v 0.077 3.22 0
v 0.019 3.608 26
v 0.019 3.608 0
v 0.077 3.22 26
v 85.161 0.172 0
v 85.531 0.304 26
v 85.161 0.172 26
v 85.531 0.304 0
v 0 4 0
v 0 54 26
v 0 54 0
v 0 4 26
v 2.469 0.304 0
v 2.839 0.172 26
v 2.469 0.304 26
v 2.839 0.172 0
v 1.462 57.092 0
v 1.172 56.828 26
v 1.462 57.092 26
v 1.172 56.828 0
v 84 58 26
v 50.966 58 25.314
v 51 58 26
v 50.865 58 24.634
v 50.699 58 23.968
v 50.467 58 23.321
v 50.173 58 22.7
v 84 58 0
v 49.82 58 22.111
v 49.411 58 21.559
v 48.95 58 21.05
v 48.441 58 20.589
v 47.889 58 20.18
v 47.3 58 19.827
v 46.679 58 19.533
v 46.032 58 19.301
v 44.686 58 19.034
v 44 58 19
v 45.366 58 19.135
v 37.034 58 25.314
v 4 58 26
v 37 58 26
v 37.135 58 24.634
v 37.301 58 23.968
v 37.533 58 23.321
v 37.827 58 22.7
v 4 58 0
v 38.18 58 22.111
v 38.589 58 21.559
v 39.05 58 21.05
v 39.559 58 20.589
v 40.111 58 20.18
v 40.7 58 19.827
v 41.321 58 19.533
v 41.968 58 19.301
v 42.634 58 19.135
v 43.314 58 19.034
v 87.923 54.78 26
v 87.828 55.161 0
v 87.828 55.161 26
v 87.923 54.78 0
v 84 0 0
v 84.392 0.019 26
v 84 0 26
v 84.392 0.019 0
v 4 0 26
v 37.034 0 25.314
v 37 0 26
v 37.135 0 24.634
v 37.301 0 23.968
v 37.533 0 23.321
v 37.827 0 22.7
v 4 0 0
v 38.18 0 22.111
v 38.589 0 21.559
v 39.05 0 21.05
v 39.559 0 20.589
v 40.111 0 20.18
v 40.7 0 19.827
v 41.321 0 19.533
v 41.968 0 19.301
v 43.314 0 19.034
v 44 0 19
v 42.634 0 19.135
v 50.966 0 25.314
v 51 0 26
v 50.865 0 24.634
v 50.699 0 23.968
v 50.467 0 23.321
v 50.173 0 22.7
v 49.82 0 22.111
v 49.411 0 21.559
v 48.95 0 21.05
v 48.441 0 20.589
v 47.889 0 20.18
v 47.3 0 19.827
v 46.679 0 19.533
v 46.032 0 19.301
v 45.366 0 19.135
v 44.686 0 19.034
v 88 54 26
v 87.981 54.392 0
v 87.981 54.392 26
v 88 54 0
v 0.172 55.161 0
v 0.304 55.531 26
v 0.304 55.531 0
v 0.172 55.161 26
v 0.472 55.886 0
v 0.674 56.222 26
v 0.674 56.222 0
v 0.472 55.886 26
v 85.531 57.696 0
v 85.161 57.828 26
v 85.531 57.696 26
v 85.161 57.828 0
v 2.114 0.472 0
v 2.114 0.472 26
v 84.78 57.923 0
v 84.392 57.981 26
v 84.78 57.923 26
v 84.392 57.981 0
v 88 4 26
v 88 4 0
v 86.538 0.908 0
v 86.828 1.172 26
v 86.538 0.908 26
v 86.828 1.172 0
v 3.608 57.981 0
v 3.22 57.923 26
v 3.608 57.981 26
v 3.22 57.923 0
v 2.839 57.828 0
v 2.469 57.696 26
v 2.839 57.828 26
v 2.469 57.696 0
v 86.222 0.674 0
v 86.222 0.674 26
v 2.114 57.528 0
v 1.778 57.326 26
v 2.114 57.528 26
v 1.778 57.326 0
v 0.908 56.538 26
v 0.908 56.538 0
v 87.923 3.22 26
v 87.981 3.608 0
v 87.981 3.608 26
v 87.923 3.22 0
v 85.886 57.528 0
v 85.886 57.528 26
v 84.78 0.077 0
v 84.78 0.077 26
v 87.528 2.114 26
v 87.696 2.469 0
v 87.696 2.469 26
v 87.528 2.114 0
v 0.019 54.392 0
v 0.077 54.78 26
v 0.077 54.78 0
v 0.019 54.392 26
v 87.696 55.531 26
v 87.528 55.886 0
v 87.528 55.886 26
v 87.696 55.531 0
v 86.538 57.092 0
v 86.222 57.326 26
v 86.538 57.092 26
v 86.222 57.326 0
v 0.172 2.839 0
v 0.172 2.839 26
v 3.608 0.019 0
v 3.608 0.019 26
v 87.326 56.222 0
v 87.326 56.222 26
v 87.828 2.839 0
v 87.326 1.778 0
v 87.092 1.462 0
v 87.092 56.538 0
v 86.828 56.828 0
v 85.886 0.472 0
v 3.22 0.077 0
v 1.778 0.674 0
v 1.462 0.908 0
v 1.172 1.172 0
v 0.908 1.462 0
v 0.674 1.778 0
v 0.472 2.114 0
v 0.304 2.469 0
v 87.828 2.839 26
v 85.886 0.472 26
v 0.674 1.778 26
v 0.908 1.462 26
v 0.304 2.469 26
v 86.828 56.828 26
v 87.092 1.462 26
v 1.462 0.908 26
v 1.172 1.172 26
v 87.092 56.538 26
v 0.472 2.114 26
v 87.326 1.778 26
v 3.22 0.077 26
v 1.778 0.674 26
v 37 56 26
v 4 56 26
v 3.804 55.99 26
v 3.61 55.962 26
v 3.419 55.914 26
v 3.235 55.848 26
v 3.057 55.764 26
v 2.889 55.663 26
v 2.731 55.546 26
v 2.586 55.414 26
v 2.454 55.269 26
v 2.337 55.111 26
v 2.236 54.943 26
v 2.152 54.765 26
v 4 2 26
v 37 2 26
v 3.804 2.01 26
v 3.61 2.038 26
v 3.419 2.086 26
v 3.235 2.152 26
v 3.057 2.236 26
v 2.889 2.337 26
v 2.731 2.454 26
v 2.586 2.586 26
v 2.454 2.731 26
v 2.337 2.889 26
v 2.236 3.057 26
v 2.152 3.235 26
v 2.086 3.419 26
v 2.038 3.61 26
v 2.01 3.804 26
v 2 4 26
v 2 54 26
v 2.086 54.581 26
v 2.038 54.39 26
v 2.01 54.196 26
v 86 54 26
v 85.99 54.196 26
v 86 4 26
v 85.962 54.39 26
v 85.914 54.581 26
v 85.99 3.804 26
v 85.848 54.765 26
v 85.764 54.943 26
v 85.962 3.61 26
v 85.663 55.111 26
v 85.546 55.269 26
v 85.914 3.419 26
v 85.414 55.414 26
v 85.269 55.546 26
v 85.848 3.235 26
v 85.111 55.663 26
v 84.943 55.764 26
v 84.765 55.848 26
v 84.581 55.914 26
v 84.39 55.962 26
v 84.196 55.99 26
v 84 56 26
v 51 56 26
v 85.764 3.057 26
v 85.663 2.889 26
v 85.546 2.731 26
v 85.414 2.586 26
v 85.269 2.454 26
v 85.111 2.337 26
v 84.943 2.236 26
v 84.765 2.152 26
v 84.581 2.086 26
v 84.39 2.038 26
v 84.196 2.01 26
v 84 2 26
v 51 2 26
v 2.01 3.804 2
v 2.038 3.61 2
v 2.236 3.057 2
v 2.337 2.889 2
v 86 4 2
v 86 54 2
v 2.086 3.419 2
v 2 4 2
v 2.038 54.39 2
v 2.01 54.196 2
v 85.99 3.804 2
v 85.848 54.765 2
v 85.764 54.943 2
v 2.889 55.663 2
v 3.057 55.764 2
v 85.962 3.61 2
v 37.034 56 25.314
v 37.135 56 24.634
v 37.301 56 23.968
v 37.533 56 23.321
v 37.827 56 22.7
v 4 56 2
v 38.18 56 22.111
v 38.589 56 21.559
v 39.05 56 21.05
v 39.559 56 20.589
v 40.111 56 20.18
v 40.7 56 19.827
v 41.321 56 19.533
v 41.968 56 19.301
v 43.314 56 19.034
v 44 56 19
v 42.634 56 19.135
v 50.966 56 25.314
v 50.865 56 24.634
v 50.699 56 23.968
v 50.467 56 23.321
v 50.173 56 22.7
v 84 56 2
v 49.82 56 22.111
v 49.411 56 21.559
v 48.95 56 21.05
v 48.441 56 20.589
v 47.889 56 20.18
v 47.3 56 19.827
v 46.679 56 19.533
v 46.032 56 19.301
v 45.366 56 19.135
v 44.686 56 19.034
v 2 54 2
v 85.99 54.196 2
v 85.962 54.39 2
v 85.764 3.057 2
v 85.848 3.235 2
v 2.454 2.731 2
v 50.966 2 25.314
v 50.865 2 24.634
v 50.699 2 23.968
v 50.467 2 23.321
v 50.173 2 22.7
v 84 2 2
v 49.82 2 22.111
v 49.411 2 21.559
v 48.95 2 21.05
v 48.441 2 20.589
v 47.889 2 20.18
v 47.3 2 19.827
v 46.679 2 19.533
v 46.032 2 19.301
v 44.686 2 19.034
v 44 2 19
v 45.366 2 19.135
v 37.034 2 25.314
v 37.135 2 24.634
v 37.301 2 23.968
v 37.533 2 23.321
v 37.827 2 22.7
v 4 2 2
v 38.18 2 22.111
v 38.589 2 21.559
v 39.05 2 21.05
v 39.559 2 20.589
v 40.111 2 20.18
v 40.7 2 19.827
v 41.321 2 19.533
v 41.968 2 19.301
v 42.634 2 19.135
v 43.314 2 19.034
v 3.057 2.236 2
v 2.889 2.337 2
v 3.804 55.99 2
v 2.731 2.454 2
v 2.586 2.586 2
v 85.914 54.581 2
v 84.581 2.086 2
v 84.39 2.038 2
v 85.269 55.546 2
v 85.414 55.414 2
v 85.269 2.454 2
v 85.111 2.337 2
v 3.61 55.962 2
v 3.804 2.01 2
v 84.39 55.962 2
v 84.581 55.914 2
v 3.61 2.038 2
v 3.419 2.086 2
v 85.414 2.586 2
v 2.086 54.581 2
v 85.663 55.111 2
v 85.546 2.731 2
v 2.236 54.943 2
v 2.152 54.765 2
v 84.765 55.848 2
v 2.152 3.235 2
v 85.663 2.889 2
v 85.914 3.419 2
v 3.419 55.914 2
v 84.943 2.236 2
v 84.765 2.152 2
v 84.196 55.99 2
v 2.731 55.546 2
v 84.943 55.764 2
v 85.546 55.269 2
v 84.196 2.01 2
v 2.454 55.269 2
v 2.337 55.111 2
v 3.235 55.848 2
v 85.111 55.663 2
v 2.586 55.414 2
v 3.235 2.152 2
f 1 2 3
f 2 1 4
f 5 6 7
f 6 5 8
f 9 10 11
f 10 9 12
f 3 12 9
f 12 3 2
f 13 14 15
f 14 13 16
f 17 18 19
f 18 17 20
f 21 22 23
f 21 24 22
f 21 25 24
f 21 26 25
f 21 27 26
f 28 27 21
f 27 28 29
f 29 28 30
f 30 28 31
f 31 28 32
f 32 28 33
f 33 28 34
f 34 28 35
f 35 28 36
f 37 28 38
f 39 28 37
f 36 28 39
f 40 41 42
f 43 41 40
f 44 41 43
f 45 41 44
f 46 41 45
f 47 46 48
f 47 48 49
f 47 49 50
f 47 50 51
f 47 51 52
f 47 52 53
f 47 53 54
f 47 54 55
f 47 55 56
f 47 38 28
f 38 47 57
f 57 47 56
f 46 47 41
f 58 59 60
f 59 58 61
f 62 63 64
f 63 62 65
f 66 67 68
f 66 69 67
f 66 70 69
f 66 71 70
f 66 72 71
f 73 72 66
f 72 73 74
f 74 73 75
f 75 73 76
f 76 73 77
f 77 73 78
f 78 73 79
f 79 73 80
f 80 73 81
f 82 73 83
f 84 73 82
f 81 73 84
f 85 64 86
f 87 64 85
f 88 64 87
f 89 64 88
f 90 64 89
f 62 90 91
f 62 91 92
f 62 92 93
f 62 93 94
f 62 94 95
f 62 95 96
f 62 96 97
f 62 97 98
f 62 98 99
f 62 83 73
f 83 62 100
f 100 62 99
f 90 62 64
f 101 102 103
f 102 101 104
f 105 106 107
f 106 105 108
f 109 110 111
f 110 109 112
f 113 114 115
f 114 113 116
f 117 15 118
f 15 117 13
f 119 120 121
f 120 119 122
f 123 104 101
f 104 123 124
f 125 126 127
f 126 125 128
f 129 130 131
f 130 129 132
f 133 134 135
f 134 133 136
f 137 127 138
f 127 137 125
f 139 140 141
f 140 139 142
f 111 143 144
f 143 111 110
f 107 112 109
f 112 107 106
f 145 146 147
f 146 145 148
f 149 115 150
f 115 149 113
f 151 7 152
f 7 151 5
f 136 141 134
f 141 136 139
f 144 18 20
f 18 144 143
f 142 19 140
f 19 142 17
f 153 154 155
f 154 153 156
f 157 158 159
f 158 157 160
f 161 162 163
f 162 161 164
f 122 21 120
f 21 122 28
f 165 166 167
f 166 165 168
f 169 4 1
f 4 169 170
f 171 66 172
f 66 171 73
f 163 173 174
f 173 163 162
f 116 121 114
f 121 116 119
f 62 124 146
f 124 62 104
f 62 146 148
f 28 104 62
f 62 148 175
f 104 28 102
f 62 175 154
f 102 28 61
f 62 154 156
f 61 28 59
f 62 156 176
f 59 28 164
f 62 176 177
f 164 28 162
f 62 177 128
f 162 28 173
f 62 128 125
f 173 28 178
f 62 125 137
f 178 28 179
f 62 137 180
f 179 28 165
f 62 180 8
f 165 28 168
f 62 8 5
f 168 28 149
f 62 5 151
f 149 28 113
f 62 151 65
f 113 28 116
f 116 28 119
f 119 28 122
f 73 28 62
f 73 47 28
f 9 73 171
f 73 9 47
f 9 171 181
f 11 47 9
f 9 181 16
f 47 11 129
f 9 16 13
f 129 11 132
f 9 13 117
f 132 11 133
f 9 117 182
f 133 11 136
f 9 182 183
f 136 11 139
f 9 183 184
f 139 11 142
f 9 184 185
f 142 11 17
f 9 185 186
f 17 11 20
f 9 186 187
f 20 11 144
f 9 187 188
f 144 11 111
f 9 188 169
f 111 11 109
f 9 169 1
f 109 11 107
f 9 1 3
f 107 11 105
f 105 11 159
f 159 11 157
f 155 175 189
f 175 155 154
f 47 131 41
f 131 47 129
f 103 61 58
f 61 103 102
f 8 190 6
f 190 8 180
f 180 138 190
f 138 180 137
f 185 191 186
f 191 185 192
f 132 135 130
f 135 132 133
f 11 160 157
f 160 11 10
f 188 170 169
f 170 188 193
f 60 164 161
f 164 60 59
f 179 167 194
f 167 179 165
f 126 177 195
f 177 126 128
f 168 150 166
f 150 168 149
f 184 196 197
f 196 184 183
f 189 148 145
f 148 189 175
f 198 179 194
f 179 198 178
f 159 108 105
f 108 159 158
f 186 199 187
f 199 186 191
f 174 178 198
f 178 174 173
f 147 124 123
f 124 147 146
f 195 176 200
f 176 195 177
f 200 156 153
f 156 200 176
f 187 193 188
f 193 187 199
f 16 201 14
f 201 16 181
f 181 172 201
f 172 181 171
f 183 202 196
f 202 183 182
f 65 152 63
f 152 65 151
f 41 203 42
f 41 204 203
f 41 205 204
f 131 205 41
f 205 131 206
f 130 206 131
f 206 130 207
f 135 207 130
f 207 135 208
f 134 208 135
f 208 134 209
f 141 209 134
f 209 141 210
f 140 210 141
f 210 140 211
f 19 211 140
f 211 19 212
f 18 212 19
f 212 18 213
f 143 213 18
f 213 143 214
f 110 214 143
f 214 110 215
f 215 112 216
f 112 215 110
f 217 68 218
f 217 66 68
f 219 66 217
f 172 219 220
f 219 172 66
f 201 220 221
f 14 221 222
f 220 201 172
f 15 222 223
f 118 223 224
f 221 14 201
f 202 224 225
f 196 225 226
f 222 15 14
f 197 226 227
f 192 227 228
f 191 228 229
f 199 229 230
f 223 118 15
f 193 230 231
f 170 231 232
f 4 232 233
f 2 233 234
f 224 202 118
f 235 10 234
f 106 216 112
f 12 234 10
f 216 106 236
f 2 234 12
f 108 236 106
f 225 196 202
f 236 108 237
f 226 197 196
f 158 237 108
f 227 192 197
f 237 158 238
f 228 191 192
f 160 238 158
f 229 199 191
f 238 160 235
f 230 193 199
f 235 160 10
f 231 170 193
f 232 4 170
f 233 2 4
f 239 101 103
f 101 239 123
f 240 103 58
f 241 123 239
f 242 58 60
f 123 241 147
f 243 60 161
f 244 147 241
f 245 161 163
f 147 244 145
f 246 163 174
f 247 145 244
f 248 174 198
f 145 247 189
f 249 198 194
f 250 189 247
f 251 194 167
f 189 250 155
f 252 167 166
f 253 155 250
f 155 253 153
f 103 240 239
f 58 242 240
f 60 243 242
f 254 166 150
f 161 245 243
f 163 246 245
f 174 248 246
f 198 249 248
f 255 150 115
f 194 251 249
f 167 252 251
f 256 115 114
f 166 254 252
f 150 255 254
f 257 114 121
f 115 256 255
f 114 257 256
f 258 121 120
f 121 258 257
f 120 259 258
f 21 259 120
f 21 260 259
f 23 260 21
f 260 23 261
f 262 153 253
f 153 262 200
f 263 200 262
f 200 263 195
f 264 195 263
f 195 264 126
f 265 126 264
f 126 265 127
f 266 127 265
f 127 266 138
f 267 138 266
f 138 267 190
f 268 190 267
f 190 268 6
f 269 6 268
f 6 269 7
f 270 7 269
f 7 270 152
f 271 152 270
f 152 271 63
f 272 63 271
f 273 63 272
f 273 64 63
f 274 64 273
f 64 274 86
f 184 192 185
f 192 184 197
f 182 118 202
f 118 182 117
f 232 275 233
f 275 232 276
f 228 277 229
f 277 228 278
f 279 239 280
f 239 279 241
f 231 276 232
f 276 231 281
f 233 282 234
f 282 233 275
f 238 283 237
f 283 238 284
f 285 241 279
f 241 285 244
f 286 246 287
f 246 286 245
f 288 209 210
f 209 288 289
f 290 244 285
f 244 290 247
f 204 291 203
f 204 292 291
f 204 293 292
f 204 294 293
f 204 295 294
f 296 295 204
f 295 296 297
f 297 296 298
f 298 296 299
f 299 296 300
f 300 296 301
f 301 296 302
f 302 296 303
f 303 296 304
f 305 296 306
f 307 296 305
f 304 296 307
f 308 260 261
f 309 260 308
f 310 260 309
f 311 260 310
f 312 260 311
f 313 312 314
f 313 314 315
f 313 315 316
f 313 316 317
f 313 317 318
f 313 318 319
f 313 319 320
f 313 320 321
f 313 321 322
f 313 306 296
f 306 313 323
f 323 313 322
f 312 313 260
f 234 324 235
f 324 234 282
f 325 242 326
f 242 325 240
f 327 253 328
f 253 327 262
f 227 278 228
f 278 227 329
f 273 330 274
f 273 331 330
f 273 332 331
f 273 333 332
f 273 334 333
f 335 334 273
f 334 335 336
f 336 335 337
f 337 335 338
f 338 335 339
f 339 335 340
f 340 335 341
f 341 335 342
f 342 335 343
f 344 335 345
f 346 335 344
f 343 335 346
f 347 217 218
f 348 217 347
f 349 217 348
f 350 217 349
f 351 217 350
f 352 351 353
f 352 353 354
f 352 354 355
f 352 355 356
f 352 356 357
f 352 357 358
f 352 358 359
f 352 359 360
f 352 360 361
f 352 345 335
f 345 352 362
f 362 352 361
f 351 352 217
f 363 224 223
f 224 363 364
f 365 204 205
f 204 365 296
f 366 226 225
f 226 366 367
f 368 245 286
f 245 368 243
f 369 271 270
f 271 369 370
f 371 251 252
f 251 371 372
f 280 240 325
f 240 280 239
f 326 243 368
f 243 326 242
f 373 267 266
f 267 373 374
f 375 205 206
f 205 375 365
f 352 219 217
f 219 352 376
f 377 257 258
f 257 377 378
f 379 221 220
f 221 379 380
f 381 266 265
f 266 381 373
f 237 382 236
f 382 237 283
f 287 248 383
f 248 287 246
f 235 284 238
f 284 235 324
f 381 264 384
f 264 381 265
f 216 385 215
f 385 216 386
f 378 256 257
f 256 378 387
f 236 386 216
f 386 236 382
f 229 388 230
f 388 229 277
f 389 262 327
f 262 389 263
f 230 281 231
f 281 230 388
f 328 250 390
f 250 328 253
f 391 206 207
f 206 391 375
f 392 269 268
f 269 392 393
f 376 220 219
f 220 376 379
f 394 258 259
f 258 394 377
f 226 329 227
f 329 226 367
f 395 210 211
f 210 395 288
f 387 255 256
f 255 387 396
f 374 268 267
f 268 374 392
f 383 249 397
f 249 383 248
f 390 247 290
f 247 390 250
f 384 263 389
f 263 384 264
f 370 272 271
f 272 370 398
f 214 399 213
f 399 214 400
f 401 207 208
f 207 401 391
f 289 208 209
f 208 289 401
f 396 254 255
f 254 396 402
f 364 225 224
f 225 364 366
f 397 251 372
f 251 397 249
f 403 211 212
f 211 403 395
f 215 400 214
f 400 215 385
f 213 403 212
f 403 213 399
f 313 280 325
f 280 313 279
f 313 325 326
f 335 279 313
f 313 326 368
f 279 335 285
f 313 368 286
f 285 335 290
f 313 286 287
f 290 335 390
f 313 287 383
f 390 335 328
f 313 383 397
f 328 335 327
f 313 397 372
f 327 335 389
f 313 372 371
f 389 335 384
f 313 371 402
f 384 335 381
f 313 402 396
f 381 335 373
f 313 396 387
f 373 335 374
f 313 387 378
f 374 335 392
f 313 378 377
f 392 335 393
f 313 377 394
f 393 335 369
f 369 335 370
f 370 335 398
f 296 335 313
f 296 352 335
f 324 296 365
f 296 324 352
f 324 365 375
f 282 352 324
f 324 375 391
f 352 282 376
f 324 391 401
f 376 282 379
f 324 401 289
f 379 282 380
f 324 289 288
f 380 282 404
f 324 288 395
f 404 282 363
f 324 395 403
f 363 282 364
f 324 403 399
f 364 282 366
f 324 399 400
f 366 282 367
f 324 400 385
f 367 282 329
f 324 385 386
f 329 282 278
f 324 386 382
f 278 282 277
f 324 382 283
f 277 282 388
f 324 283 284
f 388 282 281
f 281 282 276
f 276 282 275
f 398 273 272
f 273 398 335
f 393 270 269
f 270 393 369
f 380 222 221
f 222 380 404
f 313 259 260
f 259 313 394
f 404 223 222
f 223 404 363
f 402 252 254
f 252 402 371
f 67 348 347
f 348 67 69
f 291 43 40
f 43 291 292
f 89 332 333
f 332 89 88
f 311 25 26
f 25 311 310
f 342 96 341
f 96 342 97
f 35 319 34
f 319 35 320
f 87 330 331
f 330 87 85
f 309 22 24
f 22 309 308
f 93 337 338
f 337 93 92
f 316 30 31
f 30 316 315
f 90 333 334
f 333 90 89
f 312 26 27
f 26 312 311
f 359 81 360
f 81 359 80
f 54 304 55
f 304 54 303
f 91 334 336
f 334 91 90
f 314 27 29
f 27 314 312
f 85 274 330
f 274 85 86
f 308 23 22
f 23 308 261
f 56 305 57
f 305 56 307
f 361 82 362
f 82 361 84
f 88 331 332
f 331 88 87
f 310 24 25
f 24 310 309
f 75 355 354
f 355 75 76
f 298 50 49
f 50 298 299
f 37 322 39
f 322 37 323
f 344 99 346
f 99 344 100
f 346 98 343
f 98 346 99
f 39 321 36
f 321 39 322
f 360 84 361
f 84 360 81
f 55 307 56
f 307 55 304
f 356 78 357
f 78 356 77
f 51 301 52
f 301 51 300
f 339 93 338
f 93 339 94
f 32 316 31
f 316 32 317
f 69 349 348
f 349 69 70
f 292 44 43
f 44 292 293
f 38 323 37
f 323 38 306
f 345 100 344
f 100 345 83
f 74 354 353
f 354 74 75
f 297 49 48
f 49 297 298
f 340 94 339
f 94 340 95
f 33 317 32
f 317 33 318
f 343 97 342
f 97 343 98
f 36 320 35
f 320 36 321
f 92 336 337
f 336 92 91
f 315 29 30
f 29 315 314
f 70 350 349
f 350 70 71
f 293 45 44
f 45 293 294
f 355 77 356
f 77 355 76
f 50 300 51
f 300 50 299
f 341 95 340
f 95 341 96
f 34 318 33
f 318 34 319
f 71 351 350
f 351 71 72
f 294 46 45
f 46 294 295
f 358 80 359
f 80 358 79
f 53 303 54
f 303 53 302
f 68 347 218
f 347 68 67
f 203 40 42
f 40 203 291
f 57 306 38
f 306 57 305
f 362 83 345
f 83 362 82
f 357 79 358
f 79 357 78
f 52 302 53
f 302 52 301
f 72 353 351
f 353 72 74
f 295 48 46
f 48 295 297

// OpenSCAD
// file: ../../.claude/skills/mesa3d-print/lib/mesa3d.scad
// mesa3d.scad – constantes e módulos comuns. Use: include <../../.claude/skills/mesa3d-print/lib/mesa3d.scad>
// Mantenha estes números iguais ao printer-profile.json (não calibrados até o gauge ser impresso).
GRADE      = 25.4;   // 1 quadrado de RPG (5 pés)
FOLGA_JUSTA = 0.15;  // por lado
FOLGA_DESL  = 0.25;
PAREDE_MIN  = 1.2;
IMA_D = 6.3;  IMA_H = 3.2;   // furo para ímã 6x3
$fn = 64;

// Furo para ímã, aberto por baixo (cole o ímã depois de imprimir).
module furo_ima(d = IMA_D, h = IMA_H) { translate([0, 0, -0.01]) cylinder(d = d, h = h + 0.01); }

// Texto gravado (profundidade 0.6) no topo de uma face em z = topo.
module gravar(txt, tam = 5, topo = 0) {
  translate([0, 0, topo - 0.6]) linear_extrude(0.61)
    text(txt, size = tam, halign = "center", valign = "center", font = "Liberation Sans:style=Bold");
}

// Tile de chão: nx × ny quadrados, com sulcos da grade e (opcional) ímãs nos cantos de cada quadrado.
module tile_chao(nx = 2, ny = 2, altura = 6, sulco = 0.8, imas = false) {
  difference() {
    cube([nx * GRADE, ny * GRADE, altura]);
    for (i = [1:nx - 1]) translate([i * GRADE - sulco / 2, -1, altura - sulco]) cube([sulco, ny * GRADE + 2, sulco + 1]);
    for (j = [1:ny - 1]) translate([-1, j * GRADE - sulco / 2, altura - sulco]) cube([nx * GRADE + 2, sulco, sulco + 1]);
    if (imas) for (i = [0:nx - 1], j = [0:ny - 1]) translate([(i + 0.5) * GRADE, (j + 0.5) * GRADE, 0]) furo_ima();
  }
}
// main file
// Caixa para um conjunto de dados de RPG (7 dados: d4, d6, d8, d10, d%, d12, d20)
// com tampa de encaixe e emblema temático. Emblemas ORIGINAIS inspirados nos
// elementos – não são os símbolos oficiais de nenhum jogo.
//
// PARTE:
//   "caixa"          – base (igual para todos os elementos)
//   "tampa"          – tampa com o emblema embutido (rebaixo para a cor 2)
//   "emblema"        – só o emblema, para imprimir em outra cor dentro da tampa
//   "tampa_simples"  – tampa de uma cor só, com o emblema gravado
// A tampa já sai virada para imprimir: face de cima apoiada na mesa (fica lisa), sem suporte.
include <../../.claude/skills/mesa3d-print/lib/mesa3d.scad>

ELEMENTO = "sangue";   // sangue | morte | conhecimento | energia | medo
PARTE    = "caixa";
NOME     = true;   // false: só o emblema, centralizado (versão da loja, sem nomes)

// ---- medidas (mm) ----
INT = [84, 54, 24];    // espaço interno: cabe um jogo de 7 dados de ~16-22 mm
PAREDE = 2.0;
FUNDO  = 2.0;
RAIO   = 4;            // canto arredondado externo
TAMPA_TOPO = 3.0;
LABIO_ALT  = 5;        // borda da tampa que entra na caixa
LABIO_PAREDE = 1.6;
INLAY = 0.6;           // profundidade do emblema colorido (3 camadas de 0.2)
EXT = [INT[0] + 2 * PAREDE, INT[1] + 2 * PAREDE];

module ret_arred(tam, r) {
  hull() for (x = [r, tam[0] - r], y = [r, tam[1] - r]) translate([x, y]) circle(r = r);
}

// ---------------- emblemas (2D, centrados, ~38 mm) ----------------
module anel(r = 19, w = 1.6) { difference() { circle(r = r); circle(r = r - w); } }
module gota(s = 1) { hull() { circle(d = 6 * s); translate([0, 6.5 * s]) circle(d = 0.9); } }

module em_sangue() {
  anel();
  gota(1.5);
  for (a = [-1, 1]) rotate(a * 40) translate([0, -11]) rotate(-a * 40) gota(0.9);
  for (a = [-1, 1]) translate([a * 9.5, 7]) gota(0.6);
}
module em_morte() {
  anel();
  // ampulheta
  polygon([[-8, 11], [8, 11], [1.2, 0.8], [8, -11], [-8, -11], [-1.2, -0.8]]);
  for (y = [-12.5, 12.5]) translate([-10, y - 0.9]) square([20, 1.8]);
}
module em_conhecimento() {
  anel();
  difference() {
    intersection() { translate([0, -9]) circle(r = 14); translate([0, 9]) circle(r = 14); }
    intersection() { translate([0, -9]) circle(r = 12.4); translate([0, 9]) circle(r = 12.4); }
  }
  circle(r = 3.6);
  for (a = [-50, -25, 0, 25, 50]) rotate(a) translate([-0.6, 7.5]) square([1.2, 5]);
}
module em_energia() {
  anel();
  polygon([[3, 14], [-7, -1], [-0.5, -1], [-4, -14], [7, 2.5], [0.5, 2.5]]);
}
module em_medo() {
  difference() { anel(); for (a = [0:72:359]) rotate(a + 18) translate([-1.2, 14]) square([2.4, 6]); }
  difference() { circle(r = 6); circle(r = 4.4); }
  for (a = [0:72:359]) rotate(a) polygon([[-1.3, 7], [1.3, 7], [0, 15]]);
}
module emblema2d(e) {
  if (e == "sangue") em_sangue();
  else if (e == "morte") em_morte();
  else if (e == "conhecimento") em_conhecimento();
  else if (e == "energia") em_energia();
  else if (e == "medo") em_medo();
}
function nome(e) = e == "conhecimento" ? "CONHECIMENTO" : e == "sangue" ? "SANGUE"
  : e == "morte" ? "MORTE" : e == "energia" ? "ENERGIA" : "MEDO";

// Arte completa da tampa (emblema + nome), em coordenadas da face de cima da tampa.
module arte2d(e) {
  translate([EXT[0] / 2, EXT[1] / 2 + (NOME ? 5 : 0)]) scale(NOME ? 0.95 : 1.1) emblema2d(e);
  if (NOME) translate([EXT[0] / 2, 6.5])
    text(nome(e), size = e == "conhecimento" ? 5 : 5.5, halign = "center", valign = "center",
         font = "Liberation Sans:style=Bold", spacing = 1.1);
}

// ---------------- peças ----------------
module caixa() {
  difference() {
    linear_extrude(FUNDO + INT[2]) ret_arred(EXT, RAIO);
    translate([PAREDE, PAREDE, FUNDO]) linear_extrude(INT[2] + 1) ret_arred([INT[0], INT[1]], RAIO - PAREDE);
    // rebaixo para pegar a tampa com o dedo
    translate([EXT[0] / 2, -1, FUNDO + INT[2]]) rotate([-90, 0, 0]) cylinder(r = 7, h = EXT[1] + 2);
  }
}

// Tampa já na posição de impressão: z=0 é a face de cima (visível) da tampa.
// A arte é espelhada em X para ser lida corretamente quando a tampa for virada.
module tampa_corpo() {
  lab = [INT[0] - 2 * FOLGA_JUSTA, INT[1] - 2 * FOLGA_JUSTA];
  linear_extrude(TAMPA_TOPO) ret_arred(EXT, RAIO);
  translate([PAREDE + FOLGA_JUSTA, PAREDE + FOLGA_JUSTA, TAMPA_TOPO - 0.01])
    linear_extrude(LABIO_ALT) difference() {
      ret_arred(lab, RAIO - PAREDE);
      translate([LABIO_PAREDE, LABIO_PAREDE]) ret_arred(lab - [2, 2] * LABIO_PAREDE, max(0.5, RAIO - PAREDE - LABIO_PAREDE));
    }
}
module arte_impressao(e) { translate([EXT[0], 0]) mirror([1, 0]) arte2d(e); }

// Cores sugeridas com os filamentos disponíveis (preto, branco, vermelho): [caixa/tampa, emblema]
function cores(e) = e == "sangue" ? ["#1a1a1a", "#c0141c"] : e == "morte" ? ["#1a1a1a", "#f2f2f2"]
  : e == "conhecimento" ? ["#f2f2f2", "#1a1a1a"] : e == "energia" ? ["#c0141c", "#1a1a1a"] : ["#f2f2f2", "#c0141c"];

if (PARTE == "preview") {
  c = cores(ELEMENTO);
  color(c[0]) caixa();
  // virar a tampa = girar 180° no eixo Y (como na mão), não espelhar
  translate([EXT[0], 0, FUNDO + INT[2] + TAMPA_TOPO]) rotate([0, 180, 0]) {
    color(c[0]) difference() { tampa_corpo(); translate([0, 0, -0.01]) linear_extrude(INLAY + 0.01) arte_impressao(ELEMENTO); }
    color(c[1]) translate([0, 0, -0.02]) linear_extrude(INLAY + 0.02) arte_impressao(ELEMENTO);
  }
}
if (PARTE == "caixa") caixa();
if (PARTE == "tampa") difference() { tampa_corpo(); translate([0, 0, -0.01]) linear_extrude(INLAY + 0.01) arte_impressao(ELEMENTO); }
if (PARTE == "emblema") linear_extrude(INLAY) arte_impressao(ELEMENTO);
if (PARTE == "tampa_simples") difference() { tampa_corpo(); translate([0, 0, -0.01]) linear_extrude(0.81) arte_impressao(ELEMENTO); }
